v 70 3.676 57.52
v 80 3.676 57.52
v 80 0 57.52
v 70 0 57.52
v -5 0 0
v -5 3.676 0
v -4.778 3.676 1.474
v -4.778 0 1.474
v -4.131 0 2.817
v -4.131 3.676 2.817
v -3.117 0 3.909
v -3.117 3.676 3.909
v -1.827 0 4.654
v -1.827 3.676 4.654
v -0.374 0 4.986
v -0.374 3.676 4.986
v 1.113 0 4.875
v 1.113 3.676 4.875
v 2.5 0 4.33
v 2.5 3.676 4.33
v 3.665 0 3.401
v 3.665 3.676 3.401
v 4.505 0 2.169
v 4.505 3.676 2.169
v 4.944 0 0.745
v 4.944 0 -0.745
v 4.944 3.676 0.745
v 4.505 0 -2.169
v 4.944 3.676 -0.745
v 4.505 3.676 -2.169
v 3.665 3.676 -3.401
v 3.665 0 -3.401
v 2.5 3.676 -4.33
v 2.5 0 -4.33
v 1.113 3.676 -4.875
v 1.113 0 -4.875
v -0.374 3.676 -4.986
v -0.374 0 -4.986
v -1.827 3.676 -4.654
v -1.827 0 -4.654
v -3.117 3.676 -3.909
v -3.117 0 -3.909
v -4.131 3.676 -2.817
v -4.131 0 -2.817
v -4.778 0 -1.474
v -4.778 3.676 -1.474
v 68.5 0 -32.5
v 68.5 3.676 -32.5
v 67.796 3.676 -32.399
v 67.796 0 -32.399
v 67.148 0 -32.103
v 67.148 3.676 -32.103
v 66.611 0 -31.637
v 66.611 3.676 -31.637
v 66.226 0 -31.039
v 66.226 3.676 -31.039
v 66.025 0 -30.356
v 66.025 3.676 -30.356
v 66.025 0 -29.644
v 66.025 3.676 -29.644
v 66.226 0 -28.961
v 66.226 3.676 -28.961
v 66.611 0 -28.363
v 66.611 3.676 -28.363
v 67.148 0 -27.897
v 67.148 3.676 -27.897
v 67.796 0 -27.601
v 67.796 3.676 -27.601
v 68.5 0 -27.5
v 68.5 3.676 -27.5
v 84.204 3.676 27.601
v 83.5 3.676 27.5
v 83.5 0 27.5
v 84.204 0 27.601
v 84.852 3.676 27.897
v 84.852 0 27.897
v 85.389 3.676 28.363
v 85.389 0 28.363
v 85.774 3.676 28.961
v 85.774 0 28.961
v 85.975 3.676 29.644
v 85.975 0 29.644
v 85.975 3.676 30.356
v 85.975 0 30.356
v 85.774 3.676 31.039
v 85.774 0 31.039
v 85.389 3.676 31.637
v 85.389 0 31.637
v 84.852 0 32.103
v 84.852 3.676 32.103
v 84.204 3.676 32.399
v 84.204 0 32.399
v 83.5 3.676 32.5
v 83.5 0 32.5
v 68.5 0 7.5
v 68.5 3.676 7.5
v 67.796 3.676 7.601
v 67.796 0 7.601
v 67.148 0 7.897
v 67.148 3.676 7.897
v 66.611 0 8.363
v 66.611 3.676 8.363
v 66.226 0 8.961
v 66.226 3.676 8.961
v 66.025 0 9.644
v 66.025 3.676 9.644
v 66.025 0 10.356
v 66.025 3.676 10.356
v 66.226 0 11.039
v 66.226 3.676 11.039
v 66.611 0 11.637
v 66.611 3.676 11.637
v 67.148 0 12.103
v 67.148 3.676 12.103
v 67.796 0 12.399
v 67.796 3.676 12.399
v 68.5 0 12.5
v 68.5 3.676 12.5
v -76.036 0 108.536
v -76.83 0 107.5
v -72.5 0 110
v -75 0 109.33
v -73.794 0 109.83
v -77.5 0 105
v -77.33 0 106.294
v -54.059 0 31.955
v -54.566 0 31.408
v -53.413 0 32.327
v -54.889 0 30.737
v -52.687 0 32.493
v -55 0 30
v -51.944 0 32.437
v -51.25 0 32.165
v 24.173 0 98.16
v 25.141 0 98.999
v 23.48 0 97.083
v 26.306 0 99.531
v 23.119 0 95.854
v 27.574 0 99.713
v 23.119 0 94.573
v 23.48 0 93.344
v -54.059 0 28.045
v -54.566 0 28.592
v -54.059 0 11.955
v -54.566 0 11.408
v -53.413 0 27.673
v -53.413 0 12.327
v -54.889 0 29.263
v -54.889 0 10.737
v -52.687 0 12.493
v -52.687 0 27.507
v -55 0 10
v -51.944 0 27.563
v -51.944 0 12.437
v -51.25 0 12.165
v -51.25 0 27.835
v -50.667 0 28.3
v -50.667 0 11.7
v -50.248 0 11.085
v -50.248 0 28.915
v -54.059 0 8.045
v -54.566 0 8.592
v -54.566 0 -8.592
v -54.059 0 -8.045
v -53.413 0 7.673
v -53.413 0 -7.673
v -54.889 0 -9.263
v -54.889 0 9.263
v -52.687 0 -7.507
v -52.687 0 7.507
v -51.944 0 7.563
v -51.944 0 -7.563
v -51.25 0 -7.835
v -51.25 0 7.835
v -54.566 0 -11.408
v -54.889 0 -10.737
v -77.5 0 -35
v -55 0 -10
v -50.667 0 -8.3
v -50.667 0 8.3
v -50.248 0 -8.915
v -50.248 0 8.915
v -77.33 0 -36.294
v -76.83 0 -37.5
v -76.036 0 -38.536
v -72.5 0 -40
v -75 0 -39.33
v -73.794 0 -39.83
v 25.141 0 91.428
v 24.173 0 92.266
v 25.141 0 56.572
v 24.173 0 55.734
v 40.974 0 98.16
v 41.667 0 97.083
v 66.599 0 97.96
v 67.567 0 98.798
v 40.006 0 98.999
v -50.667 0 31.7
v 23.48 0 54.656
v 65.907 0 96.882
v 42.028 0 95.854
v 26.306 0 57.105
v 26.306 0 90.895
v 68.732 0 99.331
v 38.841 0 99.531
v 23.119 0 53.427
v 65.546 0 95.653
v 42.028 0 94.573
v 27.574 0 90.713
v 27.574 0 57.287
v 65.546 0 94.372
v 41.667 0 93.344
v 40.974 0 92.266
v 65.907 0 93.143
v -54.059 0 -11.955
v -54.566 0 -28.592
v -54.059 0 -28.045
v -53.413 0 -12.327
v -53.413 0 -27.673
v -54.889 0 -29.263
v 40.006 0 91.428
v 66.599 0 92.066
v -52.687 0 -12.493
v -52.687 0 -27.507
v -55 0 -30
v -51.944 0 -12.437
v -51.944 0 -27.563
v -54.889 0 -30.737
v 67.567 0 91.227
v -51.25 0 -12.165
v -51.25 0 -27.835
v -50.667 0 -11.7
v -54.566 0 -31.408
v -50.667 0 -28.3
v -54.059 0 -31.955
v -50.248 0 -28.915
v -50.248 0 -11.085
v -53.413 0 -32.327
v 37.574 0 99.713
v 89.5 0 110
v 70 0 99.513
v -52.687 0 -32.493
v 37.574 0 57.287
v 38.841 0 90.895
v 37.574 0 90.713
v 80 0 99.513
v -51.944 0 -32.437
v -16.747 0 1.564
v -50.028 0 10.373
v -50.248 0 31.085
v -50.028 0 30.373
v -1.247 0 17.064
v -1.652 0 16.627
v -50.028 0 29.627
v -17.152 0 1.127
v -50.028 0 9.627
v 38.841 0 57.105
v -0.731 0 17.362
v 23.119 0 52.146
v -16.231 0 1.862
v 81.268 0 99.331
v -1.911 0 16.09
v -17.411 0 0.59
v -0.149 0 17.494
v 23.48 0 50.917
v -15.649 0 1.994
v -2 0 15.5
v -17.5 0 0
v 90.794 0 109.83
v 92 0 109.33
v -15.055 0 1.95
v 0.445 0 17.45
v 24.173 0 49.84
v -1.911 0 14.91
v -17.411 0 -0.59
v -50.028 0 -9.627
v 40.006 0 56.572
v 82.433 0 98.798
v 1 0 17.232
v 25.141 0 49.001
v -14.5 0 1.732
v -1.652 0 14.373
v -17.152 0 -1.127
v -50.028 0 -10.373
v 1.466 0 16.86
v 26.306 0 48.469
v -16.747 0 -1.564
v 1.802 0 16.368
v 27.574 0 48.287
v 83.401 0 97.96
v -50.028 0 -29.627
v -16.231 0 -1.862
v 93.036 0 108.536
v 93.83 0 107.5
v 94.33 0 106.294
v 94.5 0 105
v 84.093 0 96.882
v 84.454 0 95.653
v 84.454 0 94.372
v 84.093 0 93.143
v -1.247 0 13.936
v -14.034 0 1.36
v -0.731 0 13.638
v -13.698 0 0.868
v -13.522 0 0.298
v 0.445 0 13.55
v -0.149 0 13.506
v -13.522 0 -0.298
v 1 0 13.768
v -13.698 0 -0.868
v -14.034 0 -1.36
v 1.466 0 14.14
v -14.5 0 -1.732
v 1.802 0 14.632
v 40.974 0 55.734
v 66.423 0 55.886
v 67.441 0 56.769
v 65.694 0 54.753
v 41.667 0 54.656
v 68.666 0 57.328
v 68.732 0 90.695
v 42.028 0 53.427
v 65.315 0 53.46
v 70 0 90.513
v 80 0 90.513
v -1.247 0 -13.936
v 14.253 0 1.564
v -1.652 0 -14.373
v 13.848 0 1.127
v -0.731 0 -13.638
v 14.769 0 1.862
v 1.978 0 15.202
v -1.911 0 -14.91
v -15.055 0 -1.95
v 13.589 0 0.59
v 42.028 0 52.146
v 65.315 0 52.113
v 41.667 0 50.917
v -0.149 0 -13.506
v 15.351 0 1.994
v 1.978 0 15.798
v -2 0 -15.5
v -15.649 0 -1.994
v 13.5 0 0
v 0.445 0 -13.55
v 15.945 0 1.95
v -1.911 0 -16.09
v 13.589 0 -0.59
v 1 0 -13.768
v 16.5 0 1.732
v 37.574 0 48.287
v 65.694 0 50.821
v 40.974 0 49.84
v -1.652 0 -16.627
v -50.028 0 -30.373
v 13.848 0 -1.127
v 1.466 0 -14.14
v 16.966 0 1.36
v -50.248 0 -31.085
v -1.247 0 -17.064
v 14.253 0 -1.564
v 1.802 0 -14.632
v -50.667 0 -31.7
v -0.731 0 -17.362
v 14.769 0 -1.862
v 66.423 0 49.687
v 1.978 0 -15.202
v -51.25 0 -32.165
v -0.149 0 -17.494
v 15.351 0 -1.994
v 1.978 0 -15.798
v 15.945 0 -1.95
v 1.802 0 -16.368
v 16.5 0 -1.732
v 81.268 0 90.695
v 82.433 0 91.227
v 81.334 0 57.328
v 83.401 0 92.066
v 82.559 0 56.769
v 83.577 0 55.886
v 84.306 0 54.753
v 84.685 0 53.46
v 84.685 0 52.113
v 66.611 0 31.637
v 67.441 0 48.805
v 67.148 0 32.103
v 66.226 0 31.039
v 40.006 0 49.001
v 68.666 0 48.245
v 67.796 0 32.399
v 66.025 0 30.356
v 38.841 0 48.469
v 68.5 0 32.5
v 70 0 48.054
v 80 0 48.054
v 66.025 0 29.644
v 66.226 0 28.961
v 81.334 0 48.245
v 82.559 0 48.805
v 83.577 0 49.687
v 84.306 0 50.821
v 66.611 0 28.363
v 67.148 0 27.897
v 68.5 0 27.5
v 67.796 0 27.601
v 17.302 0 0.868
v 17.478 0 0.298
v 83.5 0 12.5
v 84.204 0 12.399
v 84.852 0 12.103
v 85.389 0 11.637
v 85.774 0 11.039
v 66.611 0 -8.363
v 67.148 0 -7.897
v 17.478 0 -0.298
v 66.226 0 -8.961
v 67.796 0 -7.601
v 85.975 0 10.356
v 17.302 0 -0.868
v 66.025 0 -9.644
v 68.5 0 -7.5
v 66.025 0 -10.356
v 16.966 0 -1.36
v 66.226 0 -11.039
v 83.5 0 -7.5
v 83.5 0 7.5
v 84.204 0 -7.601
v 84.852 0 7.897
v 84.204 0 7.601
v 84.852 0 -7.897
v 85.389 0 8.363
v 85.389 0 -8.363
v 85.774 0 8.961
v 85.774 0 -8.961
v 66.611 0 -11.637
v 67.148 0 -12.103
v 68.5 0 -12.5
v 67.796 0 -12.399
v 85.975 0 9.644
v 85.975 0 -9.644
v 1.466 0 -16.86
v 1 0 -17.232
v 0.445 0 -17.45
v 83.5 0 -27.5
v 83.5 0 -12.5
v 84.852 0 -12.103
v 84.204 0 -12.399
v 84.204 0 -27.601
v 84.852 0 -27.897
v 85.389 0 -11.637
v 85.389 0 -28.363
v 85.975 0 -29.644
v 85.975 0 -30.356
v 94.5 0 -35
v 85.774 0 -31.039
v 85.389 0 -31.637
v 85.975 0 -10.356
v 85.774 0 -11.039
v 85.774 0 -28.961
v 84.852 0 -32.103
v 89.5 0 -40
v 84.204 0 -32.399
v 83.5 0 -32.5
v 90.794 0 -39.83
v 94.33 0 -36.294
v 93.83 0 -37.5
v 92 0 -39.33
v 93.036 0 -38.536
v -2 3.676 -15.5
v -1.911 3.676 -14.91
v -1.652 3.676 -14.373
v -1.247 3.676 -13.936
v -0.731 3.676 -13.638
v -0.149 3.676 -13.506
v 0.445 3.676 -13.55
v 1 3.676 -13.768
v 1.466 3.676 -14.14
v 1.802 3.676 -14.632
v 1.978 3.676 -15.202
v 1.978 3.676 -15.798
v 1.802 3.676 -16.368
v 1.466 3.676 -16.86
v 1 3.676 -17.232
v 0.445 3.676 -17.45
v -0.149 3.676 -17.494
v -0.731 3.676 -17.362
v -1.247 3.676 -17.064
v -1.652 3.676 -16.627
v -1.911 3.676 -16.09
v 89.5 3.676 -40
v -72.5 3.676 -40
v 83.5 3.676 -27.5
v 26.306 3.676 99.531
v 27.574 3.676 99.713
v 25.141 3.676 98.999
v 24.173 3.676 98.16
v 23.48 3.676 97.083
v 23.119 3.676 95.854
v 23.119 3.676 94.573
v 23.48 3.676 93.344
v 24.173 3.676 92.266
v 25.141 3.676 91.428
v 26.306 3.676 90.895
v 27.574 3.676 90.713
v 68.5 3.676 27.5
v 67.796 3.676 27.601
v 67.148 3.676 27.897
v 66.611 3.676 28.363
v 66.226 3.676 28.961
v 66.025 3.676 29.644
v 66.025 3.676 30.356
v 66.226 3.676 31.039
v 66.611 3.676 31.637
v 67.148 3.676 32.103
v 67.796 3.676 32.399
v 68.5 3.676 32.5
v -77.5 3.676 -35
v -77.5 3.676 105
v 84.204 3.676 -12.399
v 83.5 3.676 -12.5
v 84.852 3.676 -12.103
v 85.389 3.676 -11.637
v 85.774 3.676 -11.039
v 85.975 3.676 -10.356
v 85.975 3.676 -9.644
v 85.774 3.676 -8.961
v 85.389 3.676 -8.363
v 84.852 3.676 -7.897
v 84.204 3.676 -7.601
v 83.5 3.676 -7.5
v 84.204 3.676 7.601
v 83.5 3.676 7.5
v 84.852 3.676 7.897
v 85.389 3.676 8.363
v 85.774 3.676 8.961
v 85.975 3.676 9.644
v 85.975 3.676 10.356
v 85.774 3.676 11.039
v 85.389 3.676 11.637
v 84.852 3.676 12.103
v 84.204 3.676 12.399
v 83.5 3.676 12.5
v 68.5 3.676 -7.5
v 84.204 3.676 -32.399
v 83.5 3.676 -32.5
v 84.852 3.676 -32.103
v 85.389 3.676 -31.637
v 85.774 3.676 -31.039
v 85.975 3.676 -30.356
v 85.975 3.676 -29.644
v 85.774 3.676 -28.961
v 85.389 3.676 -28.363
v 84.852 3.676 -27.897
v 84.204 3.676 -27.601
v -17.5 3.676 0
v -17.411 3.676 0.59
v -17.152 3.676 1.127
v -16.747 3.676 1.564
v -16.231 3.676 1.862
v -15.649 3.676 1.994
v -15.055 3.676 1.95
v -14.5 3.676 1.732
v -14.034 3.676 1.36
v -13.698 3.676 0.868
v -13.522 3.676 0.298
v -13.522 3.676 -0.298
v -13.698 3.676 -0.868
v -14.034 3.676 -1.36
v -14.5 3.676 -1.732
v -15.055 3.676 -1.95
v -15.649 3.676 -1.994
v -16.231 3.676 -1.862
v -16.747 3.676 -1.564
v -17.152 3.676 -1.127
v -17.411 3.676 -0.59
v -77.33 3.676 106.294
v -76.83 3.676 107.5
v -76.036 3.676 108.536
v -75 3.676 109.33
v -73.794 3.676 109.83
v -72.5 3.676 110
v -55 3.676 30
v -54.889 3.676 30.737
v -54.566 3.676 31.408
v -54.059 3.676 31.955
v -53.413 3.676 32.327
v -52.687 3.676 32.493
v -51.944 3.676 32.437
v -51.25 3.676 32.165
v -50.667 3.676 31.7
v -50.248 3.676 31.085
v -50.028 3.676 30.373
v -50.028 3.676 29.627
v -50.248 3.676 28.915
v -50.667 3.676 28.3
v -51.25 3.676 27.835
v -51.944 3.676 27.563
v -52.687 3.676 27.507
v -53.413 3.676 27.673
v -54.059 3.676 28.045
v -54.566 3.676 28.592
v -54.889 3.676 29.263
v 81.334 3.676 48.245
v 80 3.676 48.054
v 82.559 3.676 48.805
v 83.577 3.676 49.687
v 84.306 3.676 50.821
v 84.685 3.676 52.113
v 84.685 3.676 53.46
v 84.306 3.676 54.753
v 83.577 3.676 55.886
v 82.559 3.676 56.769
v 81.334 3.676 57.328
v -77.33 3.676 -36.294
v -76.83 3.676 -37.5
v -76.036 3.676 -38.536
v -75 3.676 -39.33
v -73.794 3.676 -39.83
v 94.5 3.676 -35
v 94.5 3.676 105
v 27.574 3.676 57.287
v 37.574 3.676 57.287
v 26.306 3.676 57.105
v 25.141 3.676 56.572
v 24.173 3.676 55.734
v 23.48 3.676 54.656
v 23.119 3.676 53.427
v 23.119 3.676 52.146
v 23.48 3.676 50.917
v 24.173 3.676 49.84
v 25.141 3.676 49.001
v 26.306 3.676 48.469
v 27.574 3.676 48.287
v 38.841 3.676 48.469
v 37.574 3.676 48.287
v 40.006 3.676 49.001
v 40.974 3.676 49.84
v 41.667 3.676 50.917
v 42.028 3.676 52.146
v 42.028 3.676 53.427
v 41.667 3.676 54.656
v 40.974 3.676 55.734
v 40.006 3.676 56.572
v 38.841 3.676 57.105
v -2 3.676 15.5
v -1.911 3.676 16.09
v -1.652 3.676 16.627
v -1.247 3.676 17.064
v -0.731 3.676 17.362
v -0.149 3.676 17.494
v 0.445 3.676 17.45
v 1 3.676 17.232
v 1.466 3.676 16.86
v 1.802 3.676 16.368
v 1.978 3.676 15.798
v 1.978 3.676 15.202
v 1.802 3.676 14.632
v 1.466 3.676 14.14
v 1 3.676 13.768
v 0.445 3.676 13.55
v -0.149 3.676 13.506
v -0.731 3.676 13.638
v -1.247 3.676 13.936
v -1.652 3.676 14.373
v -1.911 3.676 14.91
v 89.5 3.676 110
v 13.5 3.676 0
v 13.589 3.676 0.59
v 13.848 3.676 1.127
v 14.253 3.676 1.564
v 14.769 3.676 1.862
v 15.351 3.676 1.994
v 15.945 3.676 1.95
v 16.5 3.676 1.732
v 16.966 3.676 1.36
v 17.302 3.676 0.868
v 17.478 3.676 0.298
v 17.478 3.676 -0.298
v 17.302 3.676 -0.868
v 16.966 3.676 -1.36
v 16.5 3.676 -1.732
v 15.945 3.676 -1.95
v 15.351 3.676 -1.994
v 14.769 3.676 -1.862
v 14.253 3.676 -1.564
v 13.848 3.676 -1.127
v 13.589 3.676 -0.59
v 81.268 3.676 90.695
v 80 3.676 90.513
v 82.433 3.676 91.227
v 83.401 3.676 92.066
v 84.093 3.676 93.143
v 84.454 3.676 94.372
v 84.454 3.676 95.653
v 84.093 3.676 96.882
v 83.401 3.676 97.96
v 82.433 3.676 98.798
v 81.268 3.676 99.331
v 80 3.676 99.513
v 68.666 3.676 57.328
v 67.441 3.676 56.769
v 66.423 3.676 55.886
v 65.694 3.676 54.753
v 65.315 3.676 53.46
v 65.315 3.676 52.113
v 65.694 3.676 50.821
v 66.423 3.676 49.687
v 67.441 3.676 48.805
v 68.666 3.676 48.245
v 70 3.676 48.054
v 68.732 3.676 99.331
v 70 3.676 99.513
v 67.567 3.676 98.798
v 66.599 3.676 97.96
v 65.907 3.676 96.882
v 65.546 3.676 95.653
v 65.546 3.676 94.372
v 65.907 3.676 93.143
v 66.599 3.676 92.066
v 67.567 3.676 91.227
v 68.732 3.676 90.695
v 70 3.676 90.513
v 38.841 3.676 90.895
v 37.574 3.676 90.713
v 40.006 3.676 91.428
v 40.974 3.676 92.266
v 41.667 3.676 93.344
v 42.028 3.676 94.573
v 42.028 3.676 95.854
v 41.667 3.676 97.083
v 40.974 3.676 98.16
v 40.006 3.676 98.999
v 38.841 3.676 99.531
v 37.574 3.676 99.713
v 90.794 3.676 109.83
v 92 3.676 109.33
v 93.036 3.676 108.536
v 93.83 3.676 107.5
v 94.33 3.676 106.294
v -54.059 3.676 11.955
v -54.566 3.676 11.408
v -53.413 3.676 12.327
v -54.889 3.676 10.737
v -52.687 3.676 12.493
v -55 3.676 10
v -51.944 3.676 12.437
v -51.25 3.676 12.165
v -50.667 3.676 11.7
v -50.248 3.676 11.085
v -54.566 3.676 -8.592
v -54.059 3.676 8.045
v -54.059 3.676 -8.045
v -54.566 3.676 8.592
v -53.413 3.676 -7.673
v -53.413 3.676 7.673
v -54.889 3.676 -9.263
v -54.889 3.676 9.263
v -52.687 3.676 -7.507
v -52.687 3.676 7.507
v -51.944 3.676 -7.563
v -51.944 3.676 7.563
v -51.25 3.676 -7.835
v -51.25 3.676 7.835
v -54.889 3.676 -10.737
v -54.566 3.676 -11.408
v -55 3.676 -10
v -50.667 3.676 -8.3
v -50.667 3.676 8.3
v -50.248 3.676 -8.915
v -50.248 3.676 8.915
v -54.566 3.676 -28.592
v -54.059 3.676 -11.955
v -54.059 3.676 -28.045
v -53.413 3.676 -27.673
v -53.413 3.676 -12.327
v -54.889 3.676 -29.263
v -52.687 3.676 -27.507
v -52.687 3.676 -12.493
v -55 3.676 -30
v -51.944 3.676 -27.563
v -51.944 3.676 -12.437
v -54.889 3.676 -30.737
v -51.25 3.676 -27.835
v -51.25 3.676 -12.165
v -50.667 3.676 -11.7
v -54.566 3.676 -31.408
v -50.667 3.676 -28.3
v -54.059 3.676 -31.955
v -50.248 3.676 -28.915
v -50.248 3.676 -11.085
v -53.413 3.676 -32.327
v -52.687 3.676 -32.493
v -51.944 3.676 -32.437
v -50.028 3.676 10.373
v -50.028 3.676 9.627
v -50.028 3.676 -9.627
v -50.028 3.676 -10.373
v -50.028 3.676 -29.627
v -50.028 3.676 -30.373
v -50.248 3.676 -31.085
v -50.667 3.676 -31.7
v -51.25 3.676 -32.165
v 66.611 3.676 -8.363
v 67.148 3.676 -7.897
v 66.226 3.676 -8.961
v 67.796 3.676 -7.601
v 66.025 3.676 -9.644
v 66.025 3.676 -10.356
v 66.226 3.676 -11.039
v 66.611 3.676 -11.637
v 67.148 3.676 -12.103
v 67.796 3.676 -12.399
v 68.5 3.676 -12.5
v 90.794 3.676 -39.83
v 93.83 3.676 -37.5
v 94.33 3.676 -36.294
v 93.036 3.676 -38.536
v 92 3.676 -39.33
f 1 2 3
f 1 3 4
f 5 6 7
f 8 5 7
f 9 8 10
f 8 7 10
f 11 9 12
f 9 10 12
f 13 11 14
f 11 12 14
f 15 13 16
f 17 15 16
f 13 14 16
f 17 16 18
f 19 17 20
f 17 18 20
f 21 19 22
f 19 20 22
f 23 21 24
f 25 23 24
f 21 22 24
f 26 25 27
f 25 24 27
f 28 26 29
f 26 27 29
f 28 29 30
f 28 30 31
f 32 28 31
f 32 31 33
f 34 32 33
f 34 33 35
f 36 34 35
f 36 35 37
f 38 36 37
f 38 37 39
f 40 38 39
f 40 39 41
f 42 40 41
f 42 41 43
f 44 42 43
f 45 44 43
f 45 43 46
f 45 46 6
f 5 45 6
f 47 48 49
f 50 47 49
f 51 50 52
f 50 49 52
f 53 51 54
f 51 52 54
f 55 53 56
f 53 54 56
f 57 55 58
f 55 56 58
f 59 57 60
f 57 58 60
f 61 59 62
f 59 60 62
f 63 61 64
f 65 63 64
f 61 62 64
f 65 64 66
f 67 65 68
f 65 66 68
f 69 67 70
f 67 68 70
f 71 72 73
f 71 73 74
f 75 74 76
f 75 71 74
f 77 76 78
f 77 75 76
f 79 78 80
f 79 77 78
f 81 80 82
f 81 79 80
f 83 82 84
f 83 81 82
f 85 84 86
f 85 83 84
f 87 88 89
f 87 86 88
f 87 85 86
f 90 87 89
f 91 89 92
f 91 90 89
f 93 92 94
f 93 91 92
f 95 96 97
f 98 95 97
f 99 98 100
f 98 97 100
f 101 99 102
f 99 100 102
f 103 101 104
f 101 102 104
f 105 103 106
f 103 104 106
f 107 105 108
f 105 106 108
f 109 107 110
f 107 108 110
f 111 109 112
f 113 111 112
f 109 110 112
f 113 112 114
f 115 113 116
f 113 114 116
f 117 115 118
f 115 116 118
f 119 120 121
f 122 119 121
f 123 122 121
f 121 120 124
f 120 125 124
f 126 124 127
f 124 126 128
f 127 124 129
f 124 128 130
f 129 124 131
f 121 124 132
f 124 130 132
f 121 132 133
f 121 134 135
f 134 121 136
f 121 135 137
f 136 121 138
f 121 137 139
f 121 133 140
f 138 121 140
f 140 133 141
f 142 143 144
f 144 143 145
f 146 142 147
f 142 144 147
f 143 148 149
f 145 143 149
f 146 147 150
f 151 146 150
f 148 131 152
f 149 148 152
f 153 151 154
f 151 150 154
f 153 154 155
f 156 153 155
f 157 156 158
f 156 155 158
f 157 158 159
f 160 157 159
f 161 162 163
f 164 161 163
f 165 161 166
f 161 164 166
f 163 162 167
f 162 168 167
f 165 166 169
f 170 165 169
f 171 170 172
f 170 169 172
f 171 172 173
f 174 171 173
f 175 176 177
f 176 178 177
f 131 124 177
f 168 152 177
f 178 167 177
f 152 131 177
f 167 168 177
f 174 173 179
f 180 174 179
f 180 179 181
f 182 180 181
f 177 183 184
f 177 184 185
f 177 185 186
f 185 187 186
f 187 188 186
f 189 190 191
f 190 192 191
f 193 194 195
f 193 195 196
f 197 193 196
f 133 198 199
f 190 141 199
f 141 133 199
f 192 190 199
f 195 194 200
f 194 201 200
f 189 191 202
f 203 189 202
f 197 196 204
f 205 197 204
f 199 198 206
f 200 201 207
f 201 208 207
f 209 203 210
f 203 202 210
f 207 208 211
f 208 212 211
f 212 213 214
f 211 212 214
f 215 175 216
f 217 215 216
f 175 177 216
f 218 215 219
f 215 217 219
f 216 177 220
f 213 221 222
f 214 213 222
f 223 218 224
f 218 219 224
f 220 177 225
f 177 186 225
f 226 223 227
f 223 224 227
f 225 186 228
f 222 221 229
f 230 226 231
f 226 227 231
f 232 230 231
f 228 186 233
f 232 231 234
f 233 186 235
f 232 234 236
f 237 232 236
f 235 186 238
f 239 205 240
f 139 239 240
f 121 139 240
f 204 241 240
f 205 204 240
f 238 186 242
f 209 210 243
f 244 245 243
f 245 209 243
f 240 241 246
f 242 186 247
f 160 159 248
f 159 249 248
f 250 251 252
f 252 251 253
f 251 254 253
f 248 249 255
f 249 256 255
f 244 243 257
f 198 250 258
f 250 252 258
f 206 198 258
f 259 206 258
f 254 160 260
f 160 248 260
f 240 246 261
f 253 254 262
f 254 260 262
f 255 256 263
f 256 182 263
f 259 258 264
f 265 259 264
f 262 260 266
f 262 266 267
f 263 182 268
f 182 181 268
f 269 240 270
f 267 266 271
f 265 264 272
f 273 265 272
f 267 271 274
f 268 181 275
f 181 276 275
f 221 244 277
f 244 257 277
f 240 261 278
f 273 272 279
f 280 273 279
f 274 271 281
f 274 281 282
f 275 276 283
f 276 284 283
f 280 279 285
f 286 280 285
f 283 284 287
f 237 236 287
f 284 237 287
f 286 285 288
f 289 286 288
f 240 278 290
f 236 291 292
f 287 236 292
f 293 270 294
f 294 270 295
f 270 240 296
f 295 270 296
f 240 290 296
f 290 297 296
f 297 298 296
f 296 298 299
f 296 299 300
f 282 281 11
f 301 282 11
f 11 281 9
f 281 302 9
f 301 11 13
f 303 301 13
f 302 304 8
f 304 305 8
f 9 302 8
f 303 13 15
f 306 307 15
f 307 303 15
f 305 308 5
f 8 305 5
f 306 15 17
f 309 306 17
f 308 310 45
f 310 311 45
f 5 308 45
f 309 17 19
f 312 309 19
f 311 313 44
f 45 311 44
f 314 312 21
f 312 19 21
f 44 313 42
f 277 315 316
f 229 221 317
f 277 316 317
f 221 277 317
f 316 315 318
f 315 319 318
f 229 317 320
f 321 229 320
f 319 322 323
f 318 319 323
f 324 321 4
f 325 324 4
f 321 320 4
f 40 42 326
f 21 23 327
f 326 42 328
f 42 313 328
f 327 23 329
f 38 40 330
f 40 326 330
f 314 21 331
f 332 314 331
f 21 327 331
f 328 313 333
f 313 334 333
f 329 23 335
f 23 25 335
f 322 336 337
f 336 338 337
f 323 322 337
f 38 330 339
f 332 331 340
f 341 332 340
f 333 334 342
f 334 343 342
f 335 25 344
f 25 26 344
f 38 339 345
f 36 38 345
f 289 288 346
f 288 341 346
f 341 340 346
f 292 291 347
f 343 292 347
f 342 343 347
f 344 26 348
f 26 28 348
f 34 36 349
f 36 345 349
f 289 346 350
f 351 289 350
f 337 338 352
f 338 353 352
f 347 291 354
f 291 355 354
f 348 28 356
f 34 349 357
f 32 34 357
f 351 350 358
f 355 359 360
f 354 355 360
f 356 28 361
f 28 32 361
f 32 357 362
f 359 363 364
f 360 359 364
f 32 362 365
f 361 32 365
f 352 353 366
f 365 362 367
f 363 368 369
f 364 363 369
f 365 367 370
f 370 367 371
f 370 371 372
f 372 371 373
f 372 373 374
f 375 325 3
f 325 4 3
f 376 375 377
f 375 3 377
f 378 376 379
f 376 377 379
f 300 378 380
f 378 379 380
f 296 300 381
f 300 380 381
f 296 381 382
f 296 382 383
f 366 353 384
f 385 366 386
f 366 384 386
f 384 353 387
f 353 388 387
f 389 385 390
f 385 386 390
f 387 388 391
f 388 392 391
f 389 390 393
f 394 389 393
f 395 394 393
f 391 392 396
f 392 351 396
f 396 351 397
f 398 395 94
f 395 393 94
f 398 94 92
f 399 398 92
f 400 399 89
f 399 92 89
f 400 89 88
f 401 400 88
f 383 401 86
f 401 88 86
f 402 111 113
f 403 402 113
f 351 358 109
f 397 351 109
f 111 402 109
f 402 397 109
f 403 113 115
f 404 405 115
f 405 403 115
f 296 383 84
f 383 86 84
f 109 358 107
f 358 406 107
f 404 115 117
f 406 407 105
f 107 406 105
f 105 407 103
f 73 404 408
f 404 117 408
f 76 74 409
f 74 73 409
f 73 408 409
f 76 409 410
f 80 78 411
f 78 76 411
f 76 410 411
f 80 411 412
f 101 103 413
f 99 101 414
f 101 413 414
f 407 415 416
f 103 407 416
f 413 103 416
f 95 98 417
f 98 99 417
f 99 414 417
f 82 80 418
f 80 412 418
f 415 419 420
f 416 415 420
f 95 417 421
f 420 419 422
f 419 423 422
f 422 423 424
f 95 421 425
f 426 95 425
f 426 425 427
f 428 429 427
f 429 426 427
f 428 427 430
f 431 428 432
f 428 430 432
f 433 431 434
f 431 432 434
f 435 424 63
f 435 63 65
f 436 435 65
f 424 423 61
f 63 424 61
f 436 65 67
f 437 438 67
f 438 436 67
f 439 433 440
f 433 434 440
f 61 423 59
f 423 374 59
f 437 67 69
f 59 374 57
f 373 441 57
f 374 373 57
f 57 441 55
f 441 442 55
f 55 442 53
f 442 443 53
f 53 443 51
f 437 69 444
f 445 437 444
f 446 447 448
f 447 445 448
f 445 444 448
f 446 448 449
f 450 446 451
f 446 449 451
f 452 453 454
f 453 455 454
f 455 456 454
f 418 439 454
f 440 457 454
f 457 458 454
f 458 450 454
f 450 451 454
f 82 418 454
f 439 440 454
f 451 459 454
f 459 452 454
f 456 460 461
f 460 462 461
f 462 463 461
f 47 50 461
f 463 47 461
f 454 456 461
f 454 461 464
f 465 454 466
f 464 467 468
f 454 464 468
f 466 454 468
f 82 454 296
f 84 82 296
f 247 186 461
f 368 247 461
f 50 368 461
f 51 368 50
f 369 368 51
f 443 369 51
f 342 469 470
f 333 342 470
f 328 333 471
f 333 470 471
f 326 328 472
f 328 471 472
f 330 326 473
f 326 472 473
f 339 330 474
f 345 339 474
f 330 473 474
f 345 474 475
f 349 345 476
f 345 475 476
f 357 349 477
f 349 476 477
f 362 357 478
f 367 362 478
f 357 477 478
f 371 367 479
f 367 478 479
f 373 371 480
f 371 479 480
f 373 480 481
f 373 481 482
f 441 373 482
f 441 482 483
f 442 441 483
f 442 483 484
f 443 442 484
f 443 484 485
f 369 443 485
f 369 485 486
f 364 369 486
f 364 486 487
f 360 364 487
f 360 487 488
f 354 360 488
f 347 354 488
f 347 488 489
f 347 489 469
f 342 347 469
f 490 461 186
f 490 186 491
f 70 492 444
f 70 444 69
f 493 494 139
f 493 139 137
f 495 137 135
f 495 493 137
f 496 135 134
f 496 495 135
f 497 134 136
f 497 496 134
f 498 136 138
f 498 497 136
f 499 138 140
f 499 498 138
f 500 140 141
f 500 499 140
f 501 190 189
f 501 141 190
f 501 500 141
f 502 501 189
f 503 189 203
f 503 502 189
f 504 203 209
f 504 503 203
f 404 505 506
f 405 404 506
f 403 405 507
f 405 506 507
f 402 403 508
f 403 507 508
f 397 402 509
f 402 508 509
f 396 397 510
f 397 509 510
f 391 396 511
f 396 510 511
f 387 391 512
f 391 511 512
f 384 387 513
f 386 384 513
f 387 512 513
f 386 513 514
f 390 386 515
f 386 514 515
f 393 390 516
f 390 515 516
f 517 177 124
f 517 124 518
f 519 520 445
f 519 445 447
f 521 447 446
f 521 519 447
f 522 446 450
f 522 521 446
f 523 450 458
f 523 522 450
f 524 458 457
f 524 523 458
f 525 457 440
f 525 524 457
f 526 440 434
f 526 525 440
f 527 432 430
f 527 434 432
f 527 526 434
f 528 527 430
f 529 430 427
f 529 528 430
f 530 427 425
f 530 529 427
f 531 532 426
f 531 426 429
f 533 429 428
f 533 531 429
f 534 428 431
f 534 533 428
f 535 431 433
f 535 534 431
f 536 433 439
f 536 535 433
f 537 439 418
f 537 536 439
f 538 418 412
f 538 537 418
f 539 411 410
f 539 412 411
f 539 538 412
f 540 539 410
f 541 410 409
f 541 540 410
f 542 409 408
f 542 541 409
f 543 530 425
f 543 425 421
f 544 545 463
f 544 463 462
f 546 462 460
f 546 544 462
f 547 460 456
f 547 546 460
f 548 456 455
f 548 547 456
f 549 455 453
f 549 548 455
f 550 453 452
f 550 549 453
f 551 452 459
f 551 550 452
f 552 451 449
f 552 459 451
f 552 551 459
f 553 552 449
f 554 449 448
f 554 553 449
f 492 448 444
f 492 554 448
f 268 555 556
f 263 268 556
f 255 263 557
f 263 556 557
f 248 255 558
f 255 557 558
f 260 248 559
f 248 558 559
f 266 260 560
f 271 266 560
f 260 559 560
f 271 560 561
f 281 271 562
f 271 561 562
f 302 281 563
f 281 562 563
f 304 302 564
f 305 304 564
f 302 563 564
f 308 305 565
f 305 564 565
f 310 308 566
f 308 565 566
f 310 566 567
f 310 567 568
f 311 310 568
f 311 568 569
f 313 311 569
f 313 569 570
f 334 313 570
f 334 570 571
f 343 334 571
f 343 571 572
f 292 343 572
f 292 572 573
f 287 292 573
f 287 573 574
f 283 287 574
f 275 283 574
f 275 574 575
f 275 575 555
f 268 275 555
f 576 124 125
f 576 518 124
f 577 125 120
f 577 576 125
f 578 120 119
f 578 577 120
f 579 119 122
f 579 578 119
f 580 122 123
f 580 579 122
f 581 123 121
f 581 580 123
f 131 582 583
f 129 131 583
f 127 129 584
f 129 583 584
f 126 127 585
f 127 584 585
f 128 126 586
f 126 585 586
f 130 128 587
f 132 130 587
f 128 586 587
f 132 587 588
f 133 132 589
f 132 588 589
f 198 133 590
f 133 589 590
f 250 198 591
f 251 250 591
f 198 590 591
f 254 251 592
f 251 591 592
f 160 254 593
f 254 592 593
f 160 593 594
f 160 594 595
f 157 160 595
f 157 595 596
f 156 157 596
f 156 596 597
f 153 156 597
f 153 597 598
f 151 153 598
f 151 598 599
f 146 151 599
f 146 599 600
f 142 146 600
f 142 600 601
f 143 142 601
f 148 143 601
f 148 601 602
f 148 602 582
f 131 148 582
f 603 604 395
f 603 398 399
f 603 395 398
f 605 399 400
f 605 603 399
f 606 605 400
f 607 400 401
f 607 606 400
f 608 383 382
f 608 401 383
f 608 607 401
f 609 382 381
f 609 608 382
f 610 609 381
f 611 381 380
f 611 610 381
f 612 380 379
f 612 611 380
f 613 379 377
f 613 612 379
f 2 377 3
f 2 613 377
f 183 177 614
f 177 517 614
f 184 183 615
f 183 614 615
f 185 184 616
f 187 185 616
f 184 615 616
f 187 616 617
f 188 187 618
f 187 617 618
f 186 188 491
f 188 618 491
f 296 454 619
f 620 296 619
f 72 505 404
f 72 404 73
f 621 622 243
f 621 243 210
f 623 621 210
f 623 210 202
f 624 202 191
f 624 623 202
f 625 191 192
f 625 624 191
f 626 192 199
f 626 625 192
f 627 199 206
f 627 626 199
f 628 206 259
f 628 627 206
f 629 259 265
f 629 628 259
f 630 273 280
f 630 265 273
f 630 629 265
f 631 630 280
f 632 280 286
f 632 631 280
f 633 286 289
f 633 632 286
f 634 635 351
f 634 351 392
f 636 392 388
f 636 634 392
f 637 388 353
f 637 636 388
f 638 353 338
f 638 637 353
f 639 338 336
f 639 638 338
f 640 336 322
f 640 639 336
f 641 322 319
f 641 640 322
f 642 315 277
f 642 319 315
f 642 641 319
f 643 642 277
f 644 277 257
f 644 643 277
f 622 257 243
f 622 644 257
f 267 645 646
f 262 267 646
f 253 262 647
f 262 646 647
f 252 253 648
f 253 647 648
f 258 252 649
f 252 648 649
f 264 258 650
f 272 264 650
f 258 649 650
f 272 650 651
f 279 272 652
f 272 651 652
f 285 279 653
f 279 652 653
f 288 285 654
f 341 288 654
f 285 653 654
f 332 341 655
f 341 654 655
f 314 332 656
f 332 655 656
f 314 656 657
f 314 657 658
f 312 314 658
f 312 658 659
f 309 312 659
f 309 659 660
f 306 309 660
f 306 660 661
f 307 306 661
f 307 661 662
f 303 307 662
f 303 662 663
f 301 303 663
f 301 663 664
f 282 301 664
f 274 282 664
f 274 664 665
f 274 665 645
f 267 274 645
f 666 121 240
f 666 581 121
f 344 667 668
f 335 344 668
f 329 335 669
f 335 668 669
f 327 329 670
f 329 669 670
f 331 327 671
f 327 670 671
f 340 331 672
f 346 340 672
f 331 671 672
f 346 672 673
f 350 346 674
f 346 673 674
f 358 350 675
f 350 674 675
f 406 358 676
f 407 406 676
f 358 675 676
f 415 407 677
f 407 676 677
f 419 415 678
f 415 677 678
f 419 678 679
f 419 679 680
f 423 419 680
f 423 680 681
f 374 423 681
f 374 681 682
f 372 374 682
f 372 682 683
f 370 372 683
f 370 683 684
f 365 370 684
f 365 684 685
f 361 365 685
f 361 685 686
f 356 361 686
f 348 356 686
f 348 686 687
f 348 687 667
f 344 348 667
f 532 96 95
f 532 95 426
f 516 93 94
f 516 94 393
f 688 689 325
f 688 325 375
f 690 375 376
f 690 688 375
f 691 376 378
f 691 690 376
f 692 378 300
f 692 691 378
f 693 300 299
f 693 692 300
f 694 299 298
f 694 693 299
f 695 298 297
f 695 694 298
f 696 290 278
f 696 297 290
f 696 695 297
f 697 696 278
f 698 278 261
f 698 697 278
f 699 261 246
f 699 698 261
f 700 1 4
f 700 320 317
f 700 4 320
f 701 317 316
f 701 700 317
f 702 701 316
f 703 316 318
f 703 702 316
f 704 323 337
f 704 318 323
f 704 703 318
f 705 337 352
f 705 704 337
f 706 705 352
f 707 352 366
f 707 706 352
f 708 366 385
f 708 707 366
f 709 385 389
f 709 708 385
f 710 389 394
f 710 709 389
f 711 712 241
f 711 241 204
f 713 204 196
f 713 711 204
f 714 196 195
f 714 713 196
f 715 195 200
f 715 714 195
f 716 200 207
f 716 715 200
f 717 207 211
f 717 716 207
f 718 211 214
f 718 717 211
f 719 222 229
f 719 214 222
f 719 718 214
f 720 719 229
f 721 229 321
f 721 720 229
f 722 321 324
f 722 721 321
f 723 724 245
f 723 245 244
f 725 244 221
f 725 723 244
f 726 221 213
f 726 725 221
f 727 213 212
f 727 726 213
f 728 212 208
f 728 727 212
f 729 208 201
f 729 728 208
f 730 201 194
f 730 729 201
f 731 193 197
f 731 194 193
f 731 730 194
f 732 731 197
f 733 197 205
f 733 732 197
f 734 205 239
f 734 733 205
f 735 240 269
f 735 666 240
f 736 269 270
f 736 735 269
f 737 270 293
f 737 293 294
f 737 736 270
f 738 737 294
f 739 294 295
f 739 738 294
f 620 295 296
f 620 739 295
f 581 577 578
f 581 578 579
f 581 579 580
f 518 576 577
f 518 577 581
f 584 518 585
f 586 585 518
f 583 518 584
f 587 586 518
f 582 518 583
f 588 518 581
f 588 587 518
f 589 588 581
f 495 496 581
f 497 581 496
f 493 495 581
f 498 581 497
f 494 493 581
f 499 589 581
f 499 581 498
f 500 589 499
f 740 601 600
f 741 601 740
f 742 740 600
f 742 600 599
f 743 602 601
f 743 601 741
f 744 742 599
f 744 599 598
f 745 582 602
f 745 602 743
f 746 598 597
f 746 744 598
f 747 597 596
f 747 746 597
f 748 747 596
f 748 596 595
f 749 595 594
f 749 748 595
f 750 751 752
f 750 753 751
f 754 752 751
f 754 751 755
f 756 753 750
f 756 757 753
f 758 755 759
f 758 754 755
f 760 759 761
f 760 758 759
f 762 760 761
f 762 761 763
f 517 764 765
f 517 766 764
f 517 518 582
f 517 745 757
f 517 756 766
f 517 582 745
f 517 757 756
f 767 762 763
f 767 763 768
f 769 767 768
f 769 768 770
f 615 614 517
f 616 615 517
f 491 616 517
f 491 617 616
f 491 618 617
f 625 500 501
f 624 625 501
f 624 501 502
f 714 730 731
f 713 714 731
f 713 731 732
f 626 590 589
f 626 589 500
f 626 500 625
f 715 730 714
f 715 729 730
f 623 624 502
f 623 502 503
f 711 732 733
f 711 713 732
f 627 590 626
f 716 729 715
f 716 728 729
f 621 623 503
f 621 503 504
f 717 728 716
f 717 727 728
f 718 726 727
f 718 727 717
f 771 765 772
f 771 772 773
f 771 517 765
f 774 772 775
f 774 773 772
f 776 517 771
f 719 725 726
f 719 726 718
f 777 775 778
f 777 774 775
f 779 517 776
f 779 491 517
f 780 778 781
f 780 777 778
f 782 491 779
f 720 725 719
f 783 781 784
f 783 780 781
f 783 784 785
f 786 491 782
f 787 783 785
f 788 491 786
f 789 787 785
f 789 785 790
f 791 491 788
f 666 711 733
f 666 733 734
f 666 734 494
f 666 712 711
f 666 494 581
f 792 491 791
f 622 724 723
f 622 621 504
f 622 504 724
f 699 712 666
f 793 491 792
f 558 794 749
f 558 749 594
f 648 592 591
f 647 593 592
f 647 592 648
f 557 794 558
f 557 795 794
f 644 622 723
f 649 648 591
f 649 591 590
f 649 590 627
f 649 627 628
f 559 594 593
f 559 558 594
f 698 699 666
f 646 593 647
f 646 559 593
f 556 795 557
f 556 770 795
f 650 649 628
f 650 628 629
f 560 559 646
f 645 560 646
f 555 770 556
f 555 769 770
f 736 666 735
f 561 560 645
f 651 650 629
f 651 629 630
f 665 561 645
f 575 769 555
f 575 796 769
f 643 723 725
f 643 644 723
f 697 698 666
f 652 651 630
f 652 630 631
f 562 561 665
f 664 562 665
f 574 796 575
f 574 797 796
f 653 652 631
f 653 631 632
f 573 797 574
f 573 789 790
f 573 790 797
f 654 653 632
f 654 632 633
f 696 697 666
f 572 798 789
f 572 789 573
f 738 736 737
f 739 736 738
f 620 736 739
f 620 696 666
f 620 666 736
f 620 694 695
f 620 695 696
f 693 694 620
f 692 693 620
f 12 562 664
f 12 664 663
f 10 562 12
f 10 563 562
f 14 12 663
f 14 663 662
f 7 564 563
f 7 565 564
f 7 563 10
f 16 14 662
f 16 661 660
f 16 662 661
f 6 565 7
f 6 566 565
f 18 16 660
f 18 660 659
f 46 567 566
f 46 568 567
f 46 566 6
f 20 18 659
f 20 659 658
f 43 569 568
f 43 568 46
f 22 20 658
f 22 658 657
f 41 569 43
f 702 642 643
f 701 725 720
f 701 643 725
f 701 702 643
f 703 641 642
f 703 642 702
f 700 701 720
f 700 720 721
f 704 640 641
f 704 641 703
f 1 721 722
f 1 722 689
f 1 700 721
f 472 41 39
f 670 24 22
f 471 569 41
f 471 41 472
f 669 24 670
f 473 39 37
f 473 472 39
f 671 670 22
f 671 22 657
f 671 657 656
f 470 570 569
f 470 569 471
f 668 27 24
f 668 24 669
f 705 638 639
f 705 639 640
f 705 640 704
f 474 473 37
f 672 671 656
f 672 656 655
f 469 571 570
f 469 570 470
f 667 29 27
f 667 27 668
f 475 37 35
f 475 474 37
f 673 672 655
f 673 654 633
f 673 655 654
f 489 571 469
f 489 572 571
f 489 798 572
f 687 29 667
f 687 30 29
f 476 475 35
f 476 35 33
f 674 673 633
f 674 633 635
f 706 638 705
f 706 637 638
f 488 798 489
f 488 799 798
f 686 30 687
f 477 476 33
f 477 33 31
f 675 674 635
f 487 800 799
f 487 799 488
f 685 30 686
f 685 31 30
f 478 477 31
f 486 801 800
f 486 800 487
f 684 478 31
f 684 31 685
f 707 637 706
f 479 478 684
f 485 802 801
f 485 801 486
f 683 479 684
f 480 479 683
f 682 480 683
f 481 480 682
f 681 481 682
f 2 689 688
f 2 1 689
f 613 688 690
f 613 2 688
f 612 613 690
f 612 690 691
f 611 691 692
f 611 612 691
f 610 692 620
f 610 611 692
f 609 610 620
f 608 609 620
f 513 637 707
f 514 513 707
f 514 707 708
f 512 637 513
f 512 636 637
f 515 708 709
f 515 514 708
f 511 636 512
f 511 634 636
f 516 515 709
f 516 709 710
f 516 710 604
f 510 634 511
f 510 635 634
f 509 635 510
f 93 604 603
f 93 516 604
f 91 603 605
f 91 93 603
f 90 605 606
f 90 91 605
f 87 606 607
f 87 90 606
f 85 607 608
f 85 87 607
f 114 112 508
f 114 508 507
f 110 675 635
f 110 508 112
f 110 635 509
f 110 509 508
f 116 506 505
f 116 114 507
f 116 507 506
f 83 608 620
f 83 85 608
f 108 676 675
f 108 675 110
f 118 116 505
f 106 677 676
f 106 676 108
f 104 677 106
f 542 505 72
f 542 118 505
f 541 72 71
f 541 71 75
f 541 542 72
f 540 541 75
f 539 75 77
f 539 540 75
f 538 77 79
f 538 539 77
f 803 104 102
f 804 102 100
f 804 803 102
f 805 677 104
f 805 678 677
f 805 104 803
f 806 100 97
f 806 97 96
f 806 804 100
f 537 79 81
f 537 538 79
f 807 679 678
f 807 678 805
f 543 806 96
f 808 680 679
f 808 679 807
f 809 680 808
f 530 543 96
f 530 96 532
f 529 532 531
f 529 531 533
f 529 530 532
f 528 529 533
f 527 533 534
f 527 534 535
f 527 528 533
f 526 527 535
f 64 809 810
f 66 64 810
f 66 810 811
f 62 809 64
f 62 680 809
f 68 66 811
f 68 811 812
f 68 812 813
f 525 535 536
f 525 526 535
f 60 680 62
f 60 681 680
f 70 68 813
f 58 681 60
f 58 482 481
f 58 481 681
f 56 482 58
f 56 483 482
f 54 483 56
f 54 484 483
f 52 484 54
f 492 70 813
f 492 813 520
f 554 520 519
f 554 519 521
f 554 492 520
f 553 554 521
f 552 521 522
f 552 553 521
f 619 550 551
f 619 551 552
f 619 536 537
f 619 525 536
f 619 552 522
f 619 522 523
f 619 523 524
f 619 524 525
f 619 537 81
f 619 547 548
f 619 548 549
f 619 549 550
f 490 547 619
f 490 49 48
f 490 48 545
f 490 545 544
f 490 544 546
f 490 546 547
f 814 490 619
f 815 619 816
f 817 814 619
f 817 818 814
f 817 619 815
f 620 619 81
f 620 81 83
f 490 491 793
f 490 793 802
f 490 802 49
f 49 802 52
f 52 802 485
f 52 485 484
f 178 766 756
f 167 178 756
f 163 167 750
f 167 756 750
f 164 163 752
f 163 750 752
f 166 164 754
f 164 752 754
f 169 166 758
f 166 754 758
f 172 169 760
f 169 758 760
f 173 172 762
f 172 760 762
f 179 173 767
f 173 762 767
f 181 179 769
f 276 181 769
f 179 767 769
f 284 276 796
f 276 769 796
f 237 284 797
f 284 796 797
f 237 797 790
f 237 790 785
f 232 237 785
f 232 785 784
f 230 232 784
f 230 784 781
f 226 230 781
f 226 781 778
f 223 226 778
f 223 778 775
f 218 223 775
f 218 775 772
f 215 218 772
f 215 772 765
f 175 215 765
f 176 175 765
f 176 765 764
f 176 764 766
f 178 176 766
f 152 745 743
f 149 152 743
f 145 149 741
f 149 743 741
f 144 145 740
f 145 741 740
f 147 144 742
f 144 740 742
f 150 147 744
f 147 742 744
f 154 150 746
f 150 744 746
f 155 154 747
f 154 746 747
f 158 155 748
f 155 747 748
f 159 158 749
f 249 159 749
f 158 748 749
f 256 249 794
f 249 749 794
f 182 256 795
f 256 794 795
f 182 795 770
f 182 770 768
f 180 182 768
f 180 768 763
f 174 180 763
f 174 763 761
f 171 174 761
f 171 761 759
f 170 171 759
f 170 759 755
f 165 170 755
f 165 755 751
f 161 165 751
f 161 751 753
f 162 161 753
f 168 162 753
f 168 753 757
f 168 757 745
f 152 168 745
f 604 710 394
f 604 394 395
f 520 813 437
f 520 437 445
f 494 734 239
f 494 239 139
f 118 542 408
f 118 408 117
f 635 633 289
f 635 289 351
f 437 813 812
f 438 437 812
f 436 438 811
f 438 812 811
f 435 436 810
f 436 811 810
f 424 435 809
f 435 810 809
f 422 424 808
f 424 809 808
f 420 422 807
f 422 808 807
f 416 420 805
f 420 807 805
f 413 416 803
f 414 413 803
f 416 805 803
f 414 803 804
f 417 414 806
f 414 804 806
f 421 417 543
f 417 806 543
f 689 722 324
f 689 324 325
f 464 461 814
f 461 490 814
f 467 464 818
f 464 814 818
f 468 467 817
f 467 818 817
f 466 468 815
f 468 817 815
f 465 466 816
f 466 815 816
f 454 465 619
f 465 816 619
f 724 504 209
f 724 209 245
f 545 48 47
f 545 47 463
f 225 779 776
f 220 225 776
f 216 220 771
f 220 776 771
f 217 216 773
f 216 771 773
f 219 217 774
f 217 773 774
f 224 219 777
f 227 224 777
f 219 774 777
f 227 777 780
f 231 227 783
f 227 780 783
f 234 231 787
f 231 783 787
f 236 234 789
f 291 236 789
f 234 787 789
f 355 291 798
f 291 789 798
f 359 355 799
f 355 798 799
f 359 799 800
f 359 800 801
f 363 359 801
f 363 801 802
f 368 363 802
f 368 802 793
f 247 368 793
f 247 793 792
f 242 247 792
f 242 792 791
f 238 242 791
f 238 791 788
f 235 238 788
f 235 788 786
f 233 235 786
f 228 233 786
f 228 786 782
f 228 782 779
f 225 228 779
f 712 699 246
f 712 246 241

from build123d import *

# Parameters (mm, degrees)
SKETCH_2_W          = 62.5
SKETCH_2_H          = 3.676470588
EXTRUDE_1_DEPTH     = 40
SKETCH_4_R          = 2
SKETCH_4_R_2        = 5
SKETCH_4_R_3        = 2.5
CUT_EXTRUDE_1_DEPTH = 75.295130634
SKETCH_5_W          = 125
SKETCH_5_H          = 3.676470588
EXTRUDE_3_DEPTH     = 50
SKETCH_6_W          = 130
SKETCH_6_H          = 3.676470588
EXTRUDE_4_DEPTH     = 12
SKETCH_7_R          = 2.5
CUT_EXTRUDE_2_DEPTH = 117.892114516
SKETCH_8_W          = 130
SKETCH_8_H          = 3.676470588
EXTRUDE_5_DEPTH     = 20
CUT_EXTRUDE_4_DEPTH = 131.55177684
SKETCH_11_W         = 130
SKETCH_11_H         = 3.676470588
EXTRUDE_6_DEPTH     = 15
SKETCH_12_W         = 172
SKETCH_12_H         = 3.676470588
EXTRUDE_7_DEPTH     = 20
CUT_EXTRUDE_5_DEPTH = 146.064697415
FILLET_2_R          = 5


with BuildPart() as part:
    # 草图2 → 凸台-拉伸1 (new, symmetric)
    with BuildSketch(Plane.XY):
        with Locations((-31.25, 1.838235294)):
            Rectangle(SKETCH_2_W, SKETCH_2_H)
    extrude_1 = extrude(amount=EXTRUDE_1_DEPTH, both=True)

    # 镜向1: 凸台-拉伸1 across plane
    add(extrude_1.mirror(Plane(origin=(0, 0, 40), x_dir=(0, 0, 1), z_dir=(-1, 0, 0))))

    # 草图4 → 切除-拉伸1 (cut, through all)
    with BuildSketch(Plane(origin=(0, 3.676470588, 0), x_dir=(1, 0, 0), z_dir=(0, 1, 0))):
        with Locations(Location((0, 15.5, 0), (0, 0, 180))):
            Circle(SKETCH_4_R)
        with Locations(Location((15.5, 0, 0), (0, 0, 180))):
            Circle(SKETCH_4_R)
        with Locations(Location((0, -15.5, 0), (0, 0, 180))):
            Circle(SKETCH_4_R)
        with Locations(Location((-15.5, 0, 0), (0, 0, 180))):
            Circle(SKETCH_4_R)
        with Locations(Location((0, 0, 0), (0, 0, 180))):
            Circle(SKETCH_4_R_2)
        with Locations(Location((-52.5, 10, 0), (0, 0, 180))):
            Circle(SKETCH_4_R_3)
        with Locations(Location((-52.5, 30, 0), (0, 0, 180))):
            Circle(SKETCH_4_R_3)
        with Locations(Location((-52.5, -10, 0), (0, 0, 180))):
            Circle(SKETCH_4_R_3)
        with Locations(Location((-52.5, -30, 0), (0, 0, 180))):
            Circle(SKETCH_4_R_3)
    extrude(amount=-CUT_EXTRUDE_1_DEPTH, mode=Mode.SUBTRACT)

    # 草图5 → 凸台-拉伸3 (add)
    with BuildSketch(Plane.XY.offset(40)):
        with Locations((0, 1.838235294)):
            Rectangle(SKETCH_5_W, SKETCH_5_H)
    extrude(amount=EXTRUDE_3_DEPTH)

    # 草图6 → 凸台-拉伸4 (add)
    with BuildSketch(Plane(origin=(62.5, 0, 0), x_dir=(0, 0, -1), z_dir=(1, 0, 0))):
        with Locations((-25, 1.838235294)):
            Rectangle(SKETCH_6_W, SKETCH_6_H)
    extrude(amount=EXTRUDE_4_DEPTH)

    # 草图7 → 切除-拉伸2 (cut, through all)
    with BuildSketch(Plane(origin=(0, 3.676470588, 0), x_dir=(1, 0, 0), z_dir=(0, 1, 0))):
        with Locations(Location((68.5, 30, 0), (0, 0, 180))):
            Circle(SKETCH_7_R)
        with Locations(Location((68.5, 10, 0), (0, 0, 180))):
            Circle(SKETCH_7_R)
        with Locations(Location((68.5, -10, 0), (0, 0, 180))):
            Circle(SKETCH_7_R)
        with Locations(Location((68.5, -30, 0), (0, 0, 180))):
            Circle(SKETCH_7_R)
    extrude(amount=-CUT_EXTRUDE_2_DEPTH, mode=Mode.SUBTRACT)

    # 草图8 → 凸台-拉伸5 (add)
    with BuildSketch(Plane(origin=(74.5, 0, 0), x_dir=(0, 0, -1), z_dir=(1, 0, 0))):
        with Locations((-25, 1.838235294)):
            Rectangle(SKETCH_8_W, SKETCH_8_H)
    extrude(amount=EXTRUDE_5_DEPTH)

    # 草图10 → 切除-拉伸4 (cut, through all)
    with BuildSketch(Plane(origin=(0, 3.676470588, 0), x_dir=(1, 0, 0), z_dir=(0, 1, 0))):
        with BuildLine():
            Line((68.5, 32.5), (83.5, 32.5))
            ThreePointArc((83.5, 32.5), (86, 30), (83.5, 27.5))
            Line((83.5, 27.5), (68.5, 27.5))
            ThreePointArc((68.5, 27.5), (66, 30), (68.5, 32.5))
        make_face()
        with BuildLine():
            Line((68.5, 12.5), (83.5, 12.5))
            ThreePointArc((83.5, 12.5), (86, 10), (83.5, 7.5))
            Line((83.5, 7.5), (68.5, 7.5))
            ThreePointArc((68.5, 7.5), (66, 10), (68.5, 12.5))
        make_face()
        with BuildLine():
            Line((68.5, -7.5), (83.5, -7.5))
            ThreePointArc((83.5, -7.5), (86, -10), (83.5, -12.5))
            Line((83.5, -12.5), (68.5, -12.5))
            ThreePointArc((68.5, -12.5), (66, -10), (68.5, -7.5))
        make_face()
        with BuildLine():
            Line((68.5, -27.5), (83.5, -27.5))
            ThreePointArc((83.5, -27.5), (86, -30), (83.5, -32.5))
            Line((83.5, -32.5), (68.5, -32.5))
            ThreePointArc((68.5, -32.5), (66, -30), (68.5, -27.5))
        make_face()
    extrude(amount=-CUT_EXTRUDE_4_DEPTH, mode=Mode.SUBTRACT)

    # 草图11 → 凸台-拉伸6 (add)
    with BuildSketch(Plane.ZY.offset(62.5)):
        with Locations((25, 1.838235294)):
            Rectangle(SKETCH_11_W, SKETCH_11_H)
    extrude(amount=EXTRUDE_6_DEPTH)

    # 草图12 → 凸台-拉伸7 (add)
    with BuildSketch(Plane.XY.offset(90)):
        with Locations((8.5, 1.838235294)):
            Rectangle(SKETCH_12_W, SKETCH_12_H)
    extrude(amount=EXTRUDE_7_DEPTH)

    # 草图13 → 切除-拉伸5 (cut, through all)
    with BuildSketch(Plane(origin=(0, 3.676470588, 0), x_dir=(1, 0, 0), z_dir=(0, 1, 0))):
        with BuildLine():
            Line((80, -99.512851956), (70, -99.512851956))
            ThreePointArc((70, -99.512851956), (65.5, -95.012851956), (70, -90.512851956))
            Line((70, -90.512851956), (80, -90.512851956))
            ThreePointArc((80, -90.512851956), (84.5, -95.012851956), (80, -99.512851956))
        make_face()
        with BuildLine():
            Line((37.573593129, -99.713203436), (27.573593129, -99.713203436))
            ThreePointArc((27.573593129, -99.713203436), (23.073593129, -95.213203436), (27.573593129, -90.713203436))
            Line((27.573593129, -90.713203436), (37.573593129, -90.713203436))
            ThreePointArc((37.573593129, -90.713203436), (42.073593129, -95.213203436), (37.573593129, -99.713203436))
        make_face()
        with BuildLine():
            Line((37.573593129, -57.286796564), (27.573593129, -57.286796564))
            ThreePointArc((27.573593129, -57.286796564), (23.073593129, -52.786796564), (27.573593129, -48.286796564))
            Line((27.573593129, -48.286796564), (37.573593129, -48.286796564))
            ThreePointArc((37.573593129, -48.286796564), (42.073593129, -52.786796564), (37.573593129, -57.286796564))
        make_face()
        with BuildLine():
            Line((80, -57.520090719), (70, -57.520090719))
            ThreePointArc((70, -57.520090719), (65.266705846, -52.786796564), (70, -48.05350241))
            Line((70, -48.05350241), (80, -48.05350241))
            ThreePointArc((80, -48.05350241), (84.733294154, -52.786796564), (80, -57.520090719))
        make_face()
    extrude(amount=-CUT_EXTRUDE_5_DEPTH, mode=Mode.SUBTRACT)

    # 圆角2
    fillet_2_edges = [part.edges().sort_by_distance(p)[0] for p in [
        (94.5, 1.838235294, -40),
        (-77.5, 1.838235294, -40),
        (94.5, 1.838235294, 110),
        (-77.5, 1.838235294, 110),
    ]]
    fillet(fillet_2_edges, radius=FILLET_2_R)


solid = part.part
